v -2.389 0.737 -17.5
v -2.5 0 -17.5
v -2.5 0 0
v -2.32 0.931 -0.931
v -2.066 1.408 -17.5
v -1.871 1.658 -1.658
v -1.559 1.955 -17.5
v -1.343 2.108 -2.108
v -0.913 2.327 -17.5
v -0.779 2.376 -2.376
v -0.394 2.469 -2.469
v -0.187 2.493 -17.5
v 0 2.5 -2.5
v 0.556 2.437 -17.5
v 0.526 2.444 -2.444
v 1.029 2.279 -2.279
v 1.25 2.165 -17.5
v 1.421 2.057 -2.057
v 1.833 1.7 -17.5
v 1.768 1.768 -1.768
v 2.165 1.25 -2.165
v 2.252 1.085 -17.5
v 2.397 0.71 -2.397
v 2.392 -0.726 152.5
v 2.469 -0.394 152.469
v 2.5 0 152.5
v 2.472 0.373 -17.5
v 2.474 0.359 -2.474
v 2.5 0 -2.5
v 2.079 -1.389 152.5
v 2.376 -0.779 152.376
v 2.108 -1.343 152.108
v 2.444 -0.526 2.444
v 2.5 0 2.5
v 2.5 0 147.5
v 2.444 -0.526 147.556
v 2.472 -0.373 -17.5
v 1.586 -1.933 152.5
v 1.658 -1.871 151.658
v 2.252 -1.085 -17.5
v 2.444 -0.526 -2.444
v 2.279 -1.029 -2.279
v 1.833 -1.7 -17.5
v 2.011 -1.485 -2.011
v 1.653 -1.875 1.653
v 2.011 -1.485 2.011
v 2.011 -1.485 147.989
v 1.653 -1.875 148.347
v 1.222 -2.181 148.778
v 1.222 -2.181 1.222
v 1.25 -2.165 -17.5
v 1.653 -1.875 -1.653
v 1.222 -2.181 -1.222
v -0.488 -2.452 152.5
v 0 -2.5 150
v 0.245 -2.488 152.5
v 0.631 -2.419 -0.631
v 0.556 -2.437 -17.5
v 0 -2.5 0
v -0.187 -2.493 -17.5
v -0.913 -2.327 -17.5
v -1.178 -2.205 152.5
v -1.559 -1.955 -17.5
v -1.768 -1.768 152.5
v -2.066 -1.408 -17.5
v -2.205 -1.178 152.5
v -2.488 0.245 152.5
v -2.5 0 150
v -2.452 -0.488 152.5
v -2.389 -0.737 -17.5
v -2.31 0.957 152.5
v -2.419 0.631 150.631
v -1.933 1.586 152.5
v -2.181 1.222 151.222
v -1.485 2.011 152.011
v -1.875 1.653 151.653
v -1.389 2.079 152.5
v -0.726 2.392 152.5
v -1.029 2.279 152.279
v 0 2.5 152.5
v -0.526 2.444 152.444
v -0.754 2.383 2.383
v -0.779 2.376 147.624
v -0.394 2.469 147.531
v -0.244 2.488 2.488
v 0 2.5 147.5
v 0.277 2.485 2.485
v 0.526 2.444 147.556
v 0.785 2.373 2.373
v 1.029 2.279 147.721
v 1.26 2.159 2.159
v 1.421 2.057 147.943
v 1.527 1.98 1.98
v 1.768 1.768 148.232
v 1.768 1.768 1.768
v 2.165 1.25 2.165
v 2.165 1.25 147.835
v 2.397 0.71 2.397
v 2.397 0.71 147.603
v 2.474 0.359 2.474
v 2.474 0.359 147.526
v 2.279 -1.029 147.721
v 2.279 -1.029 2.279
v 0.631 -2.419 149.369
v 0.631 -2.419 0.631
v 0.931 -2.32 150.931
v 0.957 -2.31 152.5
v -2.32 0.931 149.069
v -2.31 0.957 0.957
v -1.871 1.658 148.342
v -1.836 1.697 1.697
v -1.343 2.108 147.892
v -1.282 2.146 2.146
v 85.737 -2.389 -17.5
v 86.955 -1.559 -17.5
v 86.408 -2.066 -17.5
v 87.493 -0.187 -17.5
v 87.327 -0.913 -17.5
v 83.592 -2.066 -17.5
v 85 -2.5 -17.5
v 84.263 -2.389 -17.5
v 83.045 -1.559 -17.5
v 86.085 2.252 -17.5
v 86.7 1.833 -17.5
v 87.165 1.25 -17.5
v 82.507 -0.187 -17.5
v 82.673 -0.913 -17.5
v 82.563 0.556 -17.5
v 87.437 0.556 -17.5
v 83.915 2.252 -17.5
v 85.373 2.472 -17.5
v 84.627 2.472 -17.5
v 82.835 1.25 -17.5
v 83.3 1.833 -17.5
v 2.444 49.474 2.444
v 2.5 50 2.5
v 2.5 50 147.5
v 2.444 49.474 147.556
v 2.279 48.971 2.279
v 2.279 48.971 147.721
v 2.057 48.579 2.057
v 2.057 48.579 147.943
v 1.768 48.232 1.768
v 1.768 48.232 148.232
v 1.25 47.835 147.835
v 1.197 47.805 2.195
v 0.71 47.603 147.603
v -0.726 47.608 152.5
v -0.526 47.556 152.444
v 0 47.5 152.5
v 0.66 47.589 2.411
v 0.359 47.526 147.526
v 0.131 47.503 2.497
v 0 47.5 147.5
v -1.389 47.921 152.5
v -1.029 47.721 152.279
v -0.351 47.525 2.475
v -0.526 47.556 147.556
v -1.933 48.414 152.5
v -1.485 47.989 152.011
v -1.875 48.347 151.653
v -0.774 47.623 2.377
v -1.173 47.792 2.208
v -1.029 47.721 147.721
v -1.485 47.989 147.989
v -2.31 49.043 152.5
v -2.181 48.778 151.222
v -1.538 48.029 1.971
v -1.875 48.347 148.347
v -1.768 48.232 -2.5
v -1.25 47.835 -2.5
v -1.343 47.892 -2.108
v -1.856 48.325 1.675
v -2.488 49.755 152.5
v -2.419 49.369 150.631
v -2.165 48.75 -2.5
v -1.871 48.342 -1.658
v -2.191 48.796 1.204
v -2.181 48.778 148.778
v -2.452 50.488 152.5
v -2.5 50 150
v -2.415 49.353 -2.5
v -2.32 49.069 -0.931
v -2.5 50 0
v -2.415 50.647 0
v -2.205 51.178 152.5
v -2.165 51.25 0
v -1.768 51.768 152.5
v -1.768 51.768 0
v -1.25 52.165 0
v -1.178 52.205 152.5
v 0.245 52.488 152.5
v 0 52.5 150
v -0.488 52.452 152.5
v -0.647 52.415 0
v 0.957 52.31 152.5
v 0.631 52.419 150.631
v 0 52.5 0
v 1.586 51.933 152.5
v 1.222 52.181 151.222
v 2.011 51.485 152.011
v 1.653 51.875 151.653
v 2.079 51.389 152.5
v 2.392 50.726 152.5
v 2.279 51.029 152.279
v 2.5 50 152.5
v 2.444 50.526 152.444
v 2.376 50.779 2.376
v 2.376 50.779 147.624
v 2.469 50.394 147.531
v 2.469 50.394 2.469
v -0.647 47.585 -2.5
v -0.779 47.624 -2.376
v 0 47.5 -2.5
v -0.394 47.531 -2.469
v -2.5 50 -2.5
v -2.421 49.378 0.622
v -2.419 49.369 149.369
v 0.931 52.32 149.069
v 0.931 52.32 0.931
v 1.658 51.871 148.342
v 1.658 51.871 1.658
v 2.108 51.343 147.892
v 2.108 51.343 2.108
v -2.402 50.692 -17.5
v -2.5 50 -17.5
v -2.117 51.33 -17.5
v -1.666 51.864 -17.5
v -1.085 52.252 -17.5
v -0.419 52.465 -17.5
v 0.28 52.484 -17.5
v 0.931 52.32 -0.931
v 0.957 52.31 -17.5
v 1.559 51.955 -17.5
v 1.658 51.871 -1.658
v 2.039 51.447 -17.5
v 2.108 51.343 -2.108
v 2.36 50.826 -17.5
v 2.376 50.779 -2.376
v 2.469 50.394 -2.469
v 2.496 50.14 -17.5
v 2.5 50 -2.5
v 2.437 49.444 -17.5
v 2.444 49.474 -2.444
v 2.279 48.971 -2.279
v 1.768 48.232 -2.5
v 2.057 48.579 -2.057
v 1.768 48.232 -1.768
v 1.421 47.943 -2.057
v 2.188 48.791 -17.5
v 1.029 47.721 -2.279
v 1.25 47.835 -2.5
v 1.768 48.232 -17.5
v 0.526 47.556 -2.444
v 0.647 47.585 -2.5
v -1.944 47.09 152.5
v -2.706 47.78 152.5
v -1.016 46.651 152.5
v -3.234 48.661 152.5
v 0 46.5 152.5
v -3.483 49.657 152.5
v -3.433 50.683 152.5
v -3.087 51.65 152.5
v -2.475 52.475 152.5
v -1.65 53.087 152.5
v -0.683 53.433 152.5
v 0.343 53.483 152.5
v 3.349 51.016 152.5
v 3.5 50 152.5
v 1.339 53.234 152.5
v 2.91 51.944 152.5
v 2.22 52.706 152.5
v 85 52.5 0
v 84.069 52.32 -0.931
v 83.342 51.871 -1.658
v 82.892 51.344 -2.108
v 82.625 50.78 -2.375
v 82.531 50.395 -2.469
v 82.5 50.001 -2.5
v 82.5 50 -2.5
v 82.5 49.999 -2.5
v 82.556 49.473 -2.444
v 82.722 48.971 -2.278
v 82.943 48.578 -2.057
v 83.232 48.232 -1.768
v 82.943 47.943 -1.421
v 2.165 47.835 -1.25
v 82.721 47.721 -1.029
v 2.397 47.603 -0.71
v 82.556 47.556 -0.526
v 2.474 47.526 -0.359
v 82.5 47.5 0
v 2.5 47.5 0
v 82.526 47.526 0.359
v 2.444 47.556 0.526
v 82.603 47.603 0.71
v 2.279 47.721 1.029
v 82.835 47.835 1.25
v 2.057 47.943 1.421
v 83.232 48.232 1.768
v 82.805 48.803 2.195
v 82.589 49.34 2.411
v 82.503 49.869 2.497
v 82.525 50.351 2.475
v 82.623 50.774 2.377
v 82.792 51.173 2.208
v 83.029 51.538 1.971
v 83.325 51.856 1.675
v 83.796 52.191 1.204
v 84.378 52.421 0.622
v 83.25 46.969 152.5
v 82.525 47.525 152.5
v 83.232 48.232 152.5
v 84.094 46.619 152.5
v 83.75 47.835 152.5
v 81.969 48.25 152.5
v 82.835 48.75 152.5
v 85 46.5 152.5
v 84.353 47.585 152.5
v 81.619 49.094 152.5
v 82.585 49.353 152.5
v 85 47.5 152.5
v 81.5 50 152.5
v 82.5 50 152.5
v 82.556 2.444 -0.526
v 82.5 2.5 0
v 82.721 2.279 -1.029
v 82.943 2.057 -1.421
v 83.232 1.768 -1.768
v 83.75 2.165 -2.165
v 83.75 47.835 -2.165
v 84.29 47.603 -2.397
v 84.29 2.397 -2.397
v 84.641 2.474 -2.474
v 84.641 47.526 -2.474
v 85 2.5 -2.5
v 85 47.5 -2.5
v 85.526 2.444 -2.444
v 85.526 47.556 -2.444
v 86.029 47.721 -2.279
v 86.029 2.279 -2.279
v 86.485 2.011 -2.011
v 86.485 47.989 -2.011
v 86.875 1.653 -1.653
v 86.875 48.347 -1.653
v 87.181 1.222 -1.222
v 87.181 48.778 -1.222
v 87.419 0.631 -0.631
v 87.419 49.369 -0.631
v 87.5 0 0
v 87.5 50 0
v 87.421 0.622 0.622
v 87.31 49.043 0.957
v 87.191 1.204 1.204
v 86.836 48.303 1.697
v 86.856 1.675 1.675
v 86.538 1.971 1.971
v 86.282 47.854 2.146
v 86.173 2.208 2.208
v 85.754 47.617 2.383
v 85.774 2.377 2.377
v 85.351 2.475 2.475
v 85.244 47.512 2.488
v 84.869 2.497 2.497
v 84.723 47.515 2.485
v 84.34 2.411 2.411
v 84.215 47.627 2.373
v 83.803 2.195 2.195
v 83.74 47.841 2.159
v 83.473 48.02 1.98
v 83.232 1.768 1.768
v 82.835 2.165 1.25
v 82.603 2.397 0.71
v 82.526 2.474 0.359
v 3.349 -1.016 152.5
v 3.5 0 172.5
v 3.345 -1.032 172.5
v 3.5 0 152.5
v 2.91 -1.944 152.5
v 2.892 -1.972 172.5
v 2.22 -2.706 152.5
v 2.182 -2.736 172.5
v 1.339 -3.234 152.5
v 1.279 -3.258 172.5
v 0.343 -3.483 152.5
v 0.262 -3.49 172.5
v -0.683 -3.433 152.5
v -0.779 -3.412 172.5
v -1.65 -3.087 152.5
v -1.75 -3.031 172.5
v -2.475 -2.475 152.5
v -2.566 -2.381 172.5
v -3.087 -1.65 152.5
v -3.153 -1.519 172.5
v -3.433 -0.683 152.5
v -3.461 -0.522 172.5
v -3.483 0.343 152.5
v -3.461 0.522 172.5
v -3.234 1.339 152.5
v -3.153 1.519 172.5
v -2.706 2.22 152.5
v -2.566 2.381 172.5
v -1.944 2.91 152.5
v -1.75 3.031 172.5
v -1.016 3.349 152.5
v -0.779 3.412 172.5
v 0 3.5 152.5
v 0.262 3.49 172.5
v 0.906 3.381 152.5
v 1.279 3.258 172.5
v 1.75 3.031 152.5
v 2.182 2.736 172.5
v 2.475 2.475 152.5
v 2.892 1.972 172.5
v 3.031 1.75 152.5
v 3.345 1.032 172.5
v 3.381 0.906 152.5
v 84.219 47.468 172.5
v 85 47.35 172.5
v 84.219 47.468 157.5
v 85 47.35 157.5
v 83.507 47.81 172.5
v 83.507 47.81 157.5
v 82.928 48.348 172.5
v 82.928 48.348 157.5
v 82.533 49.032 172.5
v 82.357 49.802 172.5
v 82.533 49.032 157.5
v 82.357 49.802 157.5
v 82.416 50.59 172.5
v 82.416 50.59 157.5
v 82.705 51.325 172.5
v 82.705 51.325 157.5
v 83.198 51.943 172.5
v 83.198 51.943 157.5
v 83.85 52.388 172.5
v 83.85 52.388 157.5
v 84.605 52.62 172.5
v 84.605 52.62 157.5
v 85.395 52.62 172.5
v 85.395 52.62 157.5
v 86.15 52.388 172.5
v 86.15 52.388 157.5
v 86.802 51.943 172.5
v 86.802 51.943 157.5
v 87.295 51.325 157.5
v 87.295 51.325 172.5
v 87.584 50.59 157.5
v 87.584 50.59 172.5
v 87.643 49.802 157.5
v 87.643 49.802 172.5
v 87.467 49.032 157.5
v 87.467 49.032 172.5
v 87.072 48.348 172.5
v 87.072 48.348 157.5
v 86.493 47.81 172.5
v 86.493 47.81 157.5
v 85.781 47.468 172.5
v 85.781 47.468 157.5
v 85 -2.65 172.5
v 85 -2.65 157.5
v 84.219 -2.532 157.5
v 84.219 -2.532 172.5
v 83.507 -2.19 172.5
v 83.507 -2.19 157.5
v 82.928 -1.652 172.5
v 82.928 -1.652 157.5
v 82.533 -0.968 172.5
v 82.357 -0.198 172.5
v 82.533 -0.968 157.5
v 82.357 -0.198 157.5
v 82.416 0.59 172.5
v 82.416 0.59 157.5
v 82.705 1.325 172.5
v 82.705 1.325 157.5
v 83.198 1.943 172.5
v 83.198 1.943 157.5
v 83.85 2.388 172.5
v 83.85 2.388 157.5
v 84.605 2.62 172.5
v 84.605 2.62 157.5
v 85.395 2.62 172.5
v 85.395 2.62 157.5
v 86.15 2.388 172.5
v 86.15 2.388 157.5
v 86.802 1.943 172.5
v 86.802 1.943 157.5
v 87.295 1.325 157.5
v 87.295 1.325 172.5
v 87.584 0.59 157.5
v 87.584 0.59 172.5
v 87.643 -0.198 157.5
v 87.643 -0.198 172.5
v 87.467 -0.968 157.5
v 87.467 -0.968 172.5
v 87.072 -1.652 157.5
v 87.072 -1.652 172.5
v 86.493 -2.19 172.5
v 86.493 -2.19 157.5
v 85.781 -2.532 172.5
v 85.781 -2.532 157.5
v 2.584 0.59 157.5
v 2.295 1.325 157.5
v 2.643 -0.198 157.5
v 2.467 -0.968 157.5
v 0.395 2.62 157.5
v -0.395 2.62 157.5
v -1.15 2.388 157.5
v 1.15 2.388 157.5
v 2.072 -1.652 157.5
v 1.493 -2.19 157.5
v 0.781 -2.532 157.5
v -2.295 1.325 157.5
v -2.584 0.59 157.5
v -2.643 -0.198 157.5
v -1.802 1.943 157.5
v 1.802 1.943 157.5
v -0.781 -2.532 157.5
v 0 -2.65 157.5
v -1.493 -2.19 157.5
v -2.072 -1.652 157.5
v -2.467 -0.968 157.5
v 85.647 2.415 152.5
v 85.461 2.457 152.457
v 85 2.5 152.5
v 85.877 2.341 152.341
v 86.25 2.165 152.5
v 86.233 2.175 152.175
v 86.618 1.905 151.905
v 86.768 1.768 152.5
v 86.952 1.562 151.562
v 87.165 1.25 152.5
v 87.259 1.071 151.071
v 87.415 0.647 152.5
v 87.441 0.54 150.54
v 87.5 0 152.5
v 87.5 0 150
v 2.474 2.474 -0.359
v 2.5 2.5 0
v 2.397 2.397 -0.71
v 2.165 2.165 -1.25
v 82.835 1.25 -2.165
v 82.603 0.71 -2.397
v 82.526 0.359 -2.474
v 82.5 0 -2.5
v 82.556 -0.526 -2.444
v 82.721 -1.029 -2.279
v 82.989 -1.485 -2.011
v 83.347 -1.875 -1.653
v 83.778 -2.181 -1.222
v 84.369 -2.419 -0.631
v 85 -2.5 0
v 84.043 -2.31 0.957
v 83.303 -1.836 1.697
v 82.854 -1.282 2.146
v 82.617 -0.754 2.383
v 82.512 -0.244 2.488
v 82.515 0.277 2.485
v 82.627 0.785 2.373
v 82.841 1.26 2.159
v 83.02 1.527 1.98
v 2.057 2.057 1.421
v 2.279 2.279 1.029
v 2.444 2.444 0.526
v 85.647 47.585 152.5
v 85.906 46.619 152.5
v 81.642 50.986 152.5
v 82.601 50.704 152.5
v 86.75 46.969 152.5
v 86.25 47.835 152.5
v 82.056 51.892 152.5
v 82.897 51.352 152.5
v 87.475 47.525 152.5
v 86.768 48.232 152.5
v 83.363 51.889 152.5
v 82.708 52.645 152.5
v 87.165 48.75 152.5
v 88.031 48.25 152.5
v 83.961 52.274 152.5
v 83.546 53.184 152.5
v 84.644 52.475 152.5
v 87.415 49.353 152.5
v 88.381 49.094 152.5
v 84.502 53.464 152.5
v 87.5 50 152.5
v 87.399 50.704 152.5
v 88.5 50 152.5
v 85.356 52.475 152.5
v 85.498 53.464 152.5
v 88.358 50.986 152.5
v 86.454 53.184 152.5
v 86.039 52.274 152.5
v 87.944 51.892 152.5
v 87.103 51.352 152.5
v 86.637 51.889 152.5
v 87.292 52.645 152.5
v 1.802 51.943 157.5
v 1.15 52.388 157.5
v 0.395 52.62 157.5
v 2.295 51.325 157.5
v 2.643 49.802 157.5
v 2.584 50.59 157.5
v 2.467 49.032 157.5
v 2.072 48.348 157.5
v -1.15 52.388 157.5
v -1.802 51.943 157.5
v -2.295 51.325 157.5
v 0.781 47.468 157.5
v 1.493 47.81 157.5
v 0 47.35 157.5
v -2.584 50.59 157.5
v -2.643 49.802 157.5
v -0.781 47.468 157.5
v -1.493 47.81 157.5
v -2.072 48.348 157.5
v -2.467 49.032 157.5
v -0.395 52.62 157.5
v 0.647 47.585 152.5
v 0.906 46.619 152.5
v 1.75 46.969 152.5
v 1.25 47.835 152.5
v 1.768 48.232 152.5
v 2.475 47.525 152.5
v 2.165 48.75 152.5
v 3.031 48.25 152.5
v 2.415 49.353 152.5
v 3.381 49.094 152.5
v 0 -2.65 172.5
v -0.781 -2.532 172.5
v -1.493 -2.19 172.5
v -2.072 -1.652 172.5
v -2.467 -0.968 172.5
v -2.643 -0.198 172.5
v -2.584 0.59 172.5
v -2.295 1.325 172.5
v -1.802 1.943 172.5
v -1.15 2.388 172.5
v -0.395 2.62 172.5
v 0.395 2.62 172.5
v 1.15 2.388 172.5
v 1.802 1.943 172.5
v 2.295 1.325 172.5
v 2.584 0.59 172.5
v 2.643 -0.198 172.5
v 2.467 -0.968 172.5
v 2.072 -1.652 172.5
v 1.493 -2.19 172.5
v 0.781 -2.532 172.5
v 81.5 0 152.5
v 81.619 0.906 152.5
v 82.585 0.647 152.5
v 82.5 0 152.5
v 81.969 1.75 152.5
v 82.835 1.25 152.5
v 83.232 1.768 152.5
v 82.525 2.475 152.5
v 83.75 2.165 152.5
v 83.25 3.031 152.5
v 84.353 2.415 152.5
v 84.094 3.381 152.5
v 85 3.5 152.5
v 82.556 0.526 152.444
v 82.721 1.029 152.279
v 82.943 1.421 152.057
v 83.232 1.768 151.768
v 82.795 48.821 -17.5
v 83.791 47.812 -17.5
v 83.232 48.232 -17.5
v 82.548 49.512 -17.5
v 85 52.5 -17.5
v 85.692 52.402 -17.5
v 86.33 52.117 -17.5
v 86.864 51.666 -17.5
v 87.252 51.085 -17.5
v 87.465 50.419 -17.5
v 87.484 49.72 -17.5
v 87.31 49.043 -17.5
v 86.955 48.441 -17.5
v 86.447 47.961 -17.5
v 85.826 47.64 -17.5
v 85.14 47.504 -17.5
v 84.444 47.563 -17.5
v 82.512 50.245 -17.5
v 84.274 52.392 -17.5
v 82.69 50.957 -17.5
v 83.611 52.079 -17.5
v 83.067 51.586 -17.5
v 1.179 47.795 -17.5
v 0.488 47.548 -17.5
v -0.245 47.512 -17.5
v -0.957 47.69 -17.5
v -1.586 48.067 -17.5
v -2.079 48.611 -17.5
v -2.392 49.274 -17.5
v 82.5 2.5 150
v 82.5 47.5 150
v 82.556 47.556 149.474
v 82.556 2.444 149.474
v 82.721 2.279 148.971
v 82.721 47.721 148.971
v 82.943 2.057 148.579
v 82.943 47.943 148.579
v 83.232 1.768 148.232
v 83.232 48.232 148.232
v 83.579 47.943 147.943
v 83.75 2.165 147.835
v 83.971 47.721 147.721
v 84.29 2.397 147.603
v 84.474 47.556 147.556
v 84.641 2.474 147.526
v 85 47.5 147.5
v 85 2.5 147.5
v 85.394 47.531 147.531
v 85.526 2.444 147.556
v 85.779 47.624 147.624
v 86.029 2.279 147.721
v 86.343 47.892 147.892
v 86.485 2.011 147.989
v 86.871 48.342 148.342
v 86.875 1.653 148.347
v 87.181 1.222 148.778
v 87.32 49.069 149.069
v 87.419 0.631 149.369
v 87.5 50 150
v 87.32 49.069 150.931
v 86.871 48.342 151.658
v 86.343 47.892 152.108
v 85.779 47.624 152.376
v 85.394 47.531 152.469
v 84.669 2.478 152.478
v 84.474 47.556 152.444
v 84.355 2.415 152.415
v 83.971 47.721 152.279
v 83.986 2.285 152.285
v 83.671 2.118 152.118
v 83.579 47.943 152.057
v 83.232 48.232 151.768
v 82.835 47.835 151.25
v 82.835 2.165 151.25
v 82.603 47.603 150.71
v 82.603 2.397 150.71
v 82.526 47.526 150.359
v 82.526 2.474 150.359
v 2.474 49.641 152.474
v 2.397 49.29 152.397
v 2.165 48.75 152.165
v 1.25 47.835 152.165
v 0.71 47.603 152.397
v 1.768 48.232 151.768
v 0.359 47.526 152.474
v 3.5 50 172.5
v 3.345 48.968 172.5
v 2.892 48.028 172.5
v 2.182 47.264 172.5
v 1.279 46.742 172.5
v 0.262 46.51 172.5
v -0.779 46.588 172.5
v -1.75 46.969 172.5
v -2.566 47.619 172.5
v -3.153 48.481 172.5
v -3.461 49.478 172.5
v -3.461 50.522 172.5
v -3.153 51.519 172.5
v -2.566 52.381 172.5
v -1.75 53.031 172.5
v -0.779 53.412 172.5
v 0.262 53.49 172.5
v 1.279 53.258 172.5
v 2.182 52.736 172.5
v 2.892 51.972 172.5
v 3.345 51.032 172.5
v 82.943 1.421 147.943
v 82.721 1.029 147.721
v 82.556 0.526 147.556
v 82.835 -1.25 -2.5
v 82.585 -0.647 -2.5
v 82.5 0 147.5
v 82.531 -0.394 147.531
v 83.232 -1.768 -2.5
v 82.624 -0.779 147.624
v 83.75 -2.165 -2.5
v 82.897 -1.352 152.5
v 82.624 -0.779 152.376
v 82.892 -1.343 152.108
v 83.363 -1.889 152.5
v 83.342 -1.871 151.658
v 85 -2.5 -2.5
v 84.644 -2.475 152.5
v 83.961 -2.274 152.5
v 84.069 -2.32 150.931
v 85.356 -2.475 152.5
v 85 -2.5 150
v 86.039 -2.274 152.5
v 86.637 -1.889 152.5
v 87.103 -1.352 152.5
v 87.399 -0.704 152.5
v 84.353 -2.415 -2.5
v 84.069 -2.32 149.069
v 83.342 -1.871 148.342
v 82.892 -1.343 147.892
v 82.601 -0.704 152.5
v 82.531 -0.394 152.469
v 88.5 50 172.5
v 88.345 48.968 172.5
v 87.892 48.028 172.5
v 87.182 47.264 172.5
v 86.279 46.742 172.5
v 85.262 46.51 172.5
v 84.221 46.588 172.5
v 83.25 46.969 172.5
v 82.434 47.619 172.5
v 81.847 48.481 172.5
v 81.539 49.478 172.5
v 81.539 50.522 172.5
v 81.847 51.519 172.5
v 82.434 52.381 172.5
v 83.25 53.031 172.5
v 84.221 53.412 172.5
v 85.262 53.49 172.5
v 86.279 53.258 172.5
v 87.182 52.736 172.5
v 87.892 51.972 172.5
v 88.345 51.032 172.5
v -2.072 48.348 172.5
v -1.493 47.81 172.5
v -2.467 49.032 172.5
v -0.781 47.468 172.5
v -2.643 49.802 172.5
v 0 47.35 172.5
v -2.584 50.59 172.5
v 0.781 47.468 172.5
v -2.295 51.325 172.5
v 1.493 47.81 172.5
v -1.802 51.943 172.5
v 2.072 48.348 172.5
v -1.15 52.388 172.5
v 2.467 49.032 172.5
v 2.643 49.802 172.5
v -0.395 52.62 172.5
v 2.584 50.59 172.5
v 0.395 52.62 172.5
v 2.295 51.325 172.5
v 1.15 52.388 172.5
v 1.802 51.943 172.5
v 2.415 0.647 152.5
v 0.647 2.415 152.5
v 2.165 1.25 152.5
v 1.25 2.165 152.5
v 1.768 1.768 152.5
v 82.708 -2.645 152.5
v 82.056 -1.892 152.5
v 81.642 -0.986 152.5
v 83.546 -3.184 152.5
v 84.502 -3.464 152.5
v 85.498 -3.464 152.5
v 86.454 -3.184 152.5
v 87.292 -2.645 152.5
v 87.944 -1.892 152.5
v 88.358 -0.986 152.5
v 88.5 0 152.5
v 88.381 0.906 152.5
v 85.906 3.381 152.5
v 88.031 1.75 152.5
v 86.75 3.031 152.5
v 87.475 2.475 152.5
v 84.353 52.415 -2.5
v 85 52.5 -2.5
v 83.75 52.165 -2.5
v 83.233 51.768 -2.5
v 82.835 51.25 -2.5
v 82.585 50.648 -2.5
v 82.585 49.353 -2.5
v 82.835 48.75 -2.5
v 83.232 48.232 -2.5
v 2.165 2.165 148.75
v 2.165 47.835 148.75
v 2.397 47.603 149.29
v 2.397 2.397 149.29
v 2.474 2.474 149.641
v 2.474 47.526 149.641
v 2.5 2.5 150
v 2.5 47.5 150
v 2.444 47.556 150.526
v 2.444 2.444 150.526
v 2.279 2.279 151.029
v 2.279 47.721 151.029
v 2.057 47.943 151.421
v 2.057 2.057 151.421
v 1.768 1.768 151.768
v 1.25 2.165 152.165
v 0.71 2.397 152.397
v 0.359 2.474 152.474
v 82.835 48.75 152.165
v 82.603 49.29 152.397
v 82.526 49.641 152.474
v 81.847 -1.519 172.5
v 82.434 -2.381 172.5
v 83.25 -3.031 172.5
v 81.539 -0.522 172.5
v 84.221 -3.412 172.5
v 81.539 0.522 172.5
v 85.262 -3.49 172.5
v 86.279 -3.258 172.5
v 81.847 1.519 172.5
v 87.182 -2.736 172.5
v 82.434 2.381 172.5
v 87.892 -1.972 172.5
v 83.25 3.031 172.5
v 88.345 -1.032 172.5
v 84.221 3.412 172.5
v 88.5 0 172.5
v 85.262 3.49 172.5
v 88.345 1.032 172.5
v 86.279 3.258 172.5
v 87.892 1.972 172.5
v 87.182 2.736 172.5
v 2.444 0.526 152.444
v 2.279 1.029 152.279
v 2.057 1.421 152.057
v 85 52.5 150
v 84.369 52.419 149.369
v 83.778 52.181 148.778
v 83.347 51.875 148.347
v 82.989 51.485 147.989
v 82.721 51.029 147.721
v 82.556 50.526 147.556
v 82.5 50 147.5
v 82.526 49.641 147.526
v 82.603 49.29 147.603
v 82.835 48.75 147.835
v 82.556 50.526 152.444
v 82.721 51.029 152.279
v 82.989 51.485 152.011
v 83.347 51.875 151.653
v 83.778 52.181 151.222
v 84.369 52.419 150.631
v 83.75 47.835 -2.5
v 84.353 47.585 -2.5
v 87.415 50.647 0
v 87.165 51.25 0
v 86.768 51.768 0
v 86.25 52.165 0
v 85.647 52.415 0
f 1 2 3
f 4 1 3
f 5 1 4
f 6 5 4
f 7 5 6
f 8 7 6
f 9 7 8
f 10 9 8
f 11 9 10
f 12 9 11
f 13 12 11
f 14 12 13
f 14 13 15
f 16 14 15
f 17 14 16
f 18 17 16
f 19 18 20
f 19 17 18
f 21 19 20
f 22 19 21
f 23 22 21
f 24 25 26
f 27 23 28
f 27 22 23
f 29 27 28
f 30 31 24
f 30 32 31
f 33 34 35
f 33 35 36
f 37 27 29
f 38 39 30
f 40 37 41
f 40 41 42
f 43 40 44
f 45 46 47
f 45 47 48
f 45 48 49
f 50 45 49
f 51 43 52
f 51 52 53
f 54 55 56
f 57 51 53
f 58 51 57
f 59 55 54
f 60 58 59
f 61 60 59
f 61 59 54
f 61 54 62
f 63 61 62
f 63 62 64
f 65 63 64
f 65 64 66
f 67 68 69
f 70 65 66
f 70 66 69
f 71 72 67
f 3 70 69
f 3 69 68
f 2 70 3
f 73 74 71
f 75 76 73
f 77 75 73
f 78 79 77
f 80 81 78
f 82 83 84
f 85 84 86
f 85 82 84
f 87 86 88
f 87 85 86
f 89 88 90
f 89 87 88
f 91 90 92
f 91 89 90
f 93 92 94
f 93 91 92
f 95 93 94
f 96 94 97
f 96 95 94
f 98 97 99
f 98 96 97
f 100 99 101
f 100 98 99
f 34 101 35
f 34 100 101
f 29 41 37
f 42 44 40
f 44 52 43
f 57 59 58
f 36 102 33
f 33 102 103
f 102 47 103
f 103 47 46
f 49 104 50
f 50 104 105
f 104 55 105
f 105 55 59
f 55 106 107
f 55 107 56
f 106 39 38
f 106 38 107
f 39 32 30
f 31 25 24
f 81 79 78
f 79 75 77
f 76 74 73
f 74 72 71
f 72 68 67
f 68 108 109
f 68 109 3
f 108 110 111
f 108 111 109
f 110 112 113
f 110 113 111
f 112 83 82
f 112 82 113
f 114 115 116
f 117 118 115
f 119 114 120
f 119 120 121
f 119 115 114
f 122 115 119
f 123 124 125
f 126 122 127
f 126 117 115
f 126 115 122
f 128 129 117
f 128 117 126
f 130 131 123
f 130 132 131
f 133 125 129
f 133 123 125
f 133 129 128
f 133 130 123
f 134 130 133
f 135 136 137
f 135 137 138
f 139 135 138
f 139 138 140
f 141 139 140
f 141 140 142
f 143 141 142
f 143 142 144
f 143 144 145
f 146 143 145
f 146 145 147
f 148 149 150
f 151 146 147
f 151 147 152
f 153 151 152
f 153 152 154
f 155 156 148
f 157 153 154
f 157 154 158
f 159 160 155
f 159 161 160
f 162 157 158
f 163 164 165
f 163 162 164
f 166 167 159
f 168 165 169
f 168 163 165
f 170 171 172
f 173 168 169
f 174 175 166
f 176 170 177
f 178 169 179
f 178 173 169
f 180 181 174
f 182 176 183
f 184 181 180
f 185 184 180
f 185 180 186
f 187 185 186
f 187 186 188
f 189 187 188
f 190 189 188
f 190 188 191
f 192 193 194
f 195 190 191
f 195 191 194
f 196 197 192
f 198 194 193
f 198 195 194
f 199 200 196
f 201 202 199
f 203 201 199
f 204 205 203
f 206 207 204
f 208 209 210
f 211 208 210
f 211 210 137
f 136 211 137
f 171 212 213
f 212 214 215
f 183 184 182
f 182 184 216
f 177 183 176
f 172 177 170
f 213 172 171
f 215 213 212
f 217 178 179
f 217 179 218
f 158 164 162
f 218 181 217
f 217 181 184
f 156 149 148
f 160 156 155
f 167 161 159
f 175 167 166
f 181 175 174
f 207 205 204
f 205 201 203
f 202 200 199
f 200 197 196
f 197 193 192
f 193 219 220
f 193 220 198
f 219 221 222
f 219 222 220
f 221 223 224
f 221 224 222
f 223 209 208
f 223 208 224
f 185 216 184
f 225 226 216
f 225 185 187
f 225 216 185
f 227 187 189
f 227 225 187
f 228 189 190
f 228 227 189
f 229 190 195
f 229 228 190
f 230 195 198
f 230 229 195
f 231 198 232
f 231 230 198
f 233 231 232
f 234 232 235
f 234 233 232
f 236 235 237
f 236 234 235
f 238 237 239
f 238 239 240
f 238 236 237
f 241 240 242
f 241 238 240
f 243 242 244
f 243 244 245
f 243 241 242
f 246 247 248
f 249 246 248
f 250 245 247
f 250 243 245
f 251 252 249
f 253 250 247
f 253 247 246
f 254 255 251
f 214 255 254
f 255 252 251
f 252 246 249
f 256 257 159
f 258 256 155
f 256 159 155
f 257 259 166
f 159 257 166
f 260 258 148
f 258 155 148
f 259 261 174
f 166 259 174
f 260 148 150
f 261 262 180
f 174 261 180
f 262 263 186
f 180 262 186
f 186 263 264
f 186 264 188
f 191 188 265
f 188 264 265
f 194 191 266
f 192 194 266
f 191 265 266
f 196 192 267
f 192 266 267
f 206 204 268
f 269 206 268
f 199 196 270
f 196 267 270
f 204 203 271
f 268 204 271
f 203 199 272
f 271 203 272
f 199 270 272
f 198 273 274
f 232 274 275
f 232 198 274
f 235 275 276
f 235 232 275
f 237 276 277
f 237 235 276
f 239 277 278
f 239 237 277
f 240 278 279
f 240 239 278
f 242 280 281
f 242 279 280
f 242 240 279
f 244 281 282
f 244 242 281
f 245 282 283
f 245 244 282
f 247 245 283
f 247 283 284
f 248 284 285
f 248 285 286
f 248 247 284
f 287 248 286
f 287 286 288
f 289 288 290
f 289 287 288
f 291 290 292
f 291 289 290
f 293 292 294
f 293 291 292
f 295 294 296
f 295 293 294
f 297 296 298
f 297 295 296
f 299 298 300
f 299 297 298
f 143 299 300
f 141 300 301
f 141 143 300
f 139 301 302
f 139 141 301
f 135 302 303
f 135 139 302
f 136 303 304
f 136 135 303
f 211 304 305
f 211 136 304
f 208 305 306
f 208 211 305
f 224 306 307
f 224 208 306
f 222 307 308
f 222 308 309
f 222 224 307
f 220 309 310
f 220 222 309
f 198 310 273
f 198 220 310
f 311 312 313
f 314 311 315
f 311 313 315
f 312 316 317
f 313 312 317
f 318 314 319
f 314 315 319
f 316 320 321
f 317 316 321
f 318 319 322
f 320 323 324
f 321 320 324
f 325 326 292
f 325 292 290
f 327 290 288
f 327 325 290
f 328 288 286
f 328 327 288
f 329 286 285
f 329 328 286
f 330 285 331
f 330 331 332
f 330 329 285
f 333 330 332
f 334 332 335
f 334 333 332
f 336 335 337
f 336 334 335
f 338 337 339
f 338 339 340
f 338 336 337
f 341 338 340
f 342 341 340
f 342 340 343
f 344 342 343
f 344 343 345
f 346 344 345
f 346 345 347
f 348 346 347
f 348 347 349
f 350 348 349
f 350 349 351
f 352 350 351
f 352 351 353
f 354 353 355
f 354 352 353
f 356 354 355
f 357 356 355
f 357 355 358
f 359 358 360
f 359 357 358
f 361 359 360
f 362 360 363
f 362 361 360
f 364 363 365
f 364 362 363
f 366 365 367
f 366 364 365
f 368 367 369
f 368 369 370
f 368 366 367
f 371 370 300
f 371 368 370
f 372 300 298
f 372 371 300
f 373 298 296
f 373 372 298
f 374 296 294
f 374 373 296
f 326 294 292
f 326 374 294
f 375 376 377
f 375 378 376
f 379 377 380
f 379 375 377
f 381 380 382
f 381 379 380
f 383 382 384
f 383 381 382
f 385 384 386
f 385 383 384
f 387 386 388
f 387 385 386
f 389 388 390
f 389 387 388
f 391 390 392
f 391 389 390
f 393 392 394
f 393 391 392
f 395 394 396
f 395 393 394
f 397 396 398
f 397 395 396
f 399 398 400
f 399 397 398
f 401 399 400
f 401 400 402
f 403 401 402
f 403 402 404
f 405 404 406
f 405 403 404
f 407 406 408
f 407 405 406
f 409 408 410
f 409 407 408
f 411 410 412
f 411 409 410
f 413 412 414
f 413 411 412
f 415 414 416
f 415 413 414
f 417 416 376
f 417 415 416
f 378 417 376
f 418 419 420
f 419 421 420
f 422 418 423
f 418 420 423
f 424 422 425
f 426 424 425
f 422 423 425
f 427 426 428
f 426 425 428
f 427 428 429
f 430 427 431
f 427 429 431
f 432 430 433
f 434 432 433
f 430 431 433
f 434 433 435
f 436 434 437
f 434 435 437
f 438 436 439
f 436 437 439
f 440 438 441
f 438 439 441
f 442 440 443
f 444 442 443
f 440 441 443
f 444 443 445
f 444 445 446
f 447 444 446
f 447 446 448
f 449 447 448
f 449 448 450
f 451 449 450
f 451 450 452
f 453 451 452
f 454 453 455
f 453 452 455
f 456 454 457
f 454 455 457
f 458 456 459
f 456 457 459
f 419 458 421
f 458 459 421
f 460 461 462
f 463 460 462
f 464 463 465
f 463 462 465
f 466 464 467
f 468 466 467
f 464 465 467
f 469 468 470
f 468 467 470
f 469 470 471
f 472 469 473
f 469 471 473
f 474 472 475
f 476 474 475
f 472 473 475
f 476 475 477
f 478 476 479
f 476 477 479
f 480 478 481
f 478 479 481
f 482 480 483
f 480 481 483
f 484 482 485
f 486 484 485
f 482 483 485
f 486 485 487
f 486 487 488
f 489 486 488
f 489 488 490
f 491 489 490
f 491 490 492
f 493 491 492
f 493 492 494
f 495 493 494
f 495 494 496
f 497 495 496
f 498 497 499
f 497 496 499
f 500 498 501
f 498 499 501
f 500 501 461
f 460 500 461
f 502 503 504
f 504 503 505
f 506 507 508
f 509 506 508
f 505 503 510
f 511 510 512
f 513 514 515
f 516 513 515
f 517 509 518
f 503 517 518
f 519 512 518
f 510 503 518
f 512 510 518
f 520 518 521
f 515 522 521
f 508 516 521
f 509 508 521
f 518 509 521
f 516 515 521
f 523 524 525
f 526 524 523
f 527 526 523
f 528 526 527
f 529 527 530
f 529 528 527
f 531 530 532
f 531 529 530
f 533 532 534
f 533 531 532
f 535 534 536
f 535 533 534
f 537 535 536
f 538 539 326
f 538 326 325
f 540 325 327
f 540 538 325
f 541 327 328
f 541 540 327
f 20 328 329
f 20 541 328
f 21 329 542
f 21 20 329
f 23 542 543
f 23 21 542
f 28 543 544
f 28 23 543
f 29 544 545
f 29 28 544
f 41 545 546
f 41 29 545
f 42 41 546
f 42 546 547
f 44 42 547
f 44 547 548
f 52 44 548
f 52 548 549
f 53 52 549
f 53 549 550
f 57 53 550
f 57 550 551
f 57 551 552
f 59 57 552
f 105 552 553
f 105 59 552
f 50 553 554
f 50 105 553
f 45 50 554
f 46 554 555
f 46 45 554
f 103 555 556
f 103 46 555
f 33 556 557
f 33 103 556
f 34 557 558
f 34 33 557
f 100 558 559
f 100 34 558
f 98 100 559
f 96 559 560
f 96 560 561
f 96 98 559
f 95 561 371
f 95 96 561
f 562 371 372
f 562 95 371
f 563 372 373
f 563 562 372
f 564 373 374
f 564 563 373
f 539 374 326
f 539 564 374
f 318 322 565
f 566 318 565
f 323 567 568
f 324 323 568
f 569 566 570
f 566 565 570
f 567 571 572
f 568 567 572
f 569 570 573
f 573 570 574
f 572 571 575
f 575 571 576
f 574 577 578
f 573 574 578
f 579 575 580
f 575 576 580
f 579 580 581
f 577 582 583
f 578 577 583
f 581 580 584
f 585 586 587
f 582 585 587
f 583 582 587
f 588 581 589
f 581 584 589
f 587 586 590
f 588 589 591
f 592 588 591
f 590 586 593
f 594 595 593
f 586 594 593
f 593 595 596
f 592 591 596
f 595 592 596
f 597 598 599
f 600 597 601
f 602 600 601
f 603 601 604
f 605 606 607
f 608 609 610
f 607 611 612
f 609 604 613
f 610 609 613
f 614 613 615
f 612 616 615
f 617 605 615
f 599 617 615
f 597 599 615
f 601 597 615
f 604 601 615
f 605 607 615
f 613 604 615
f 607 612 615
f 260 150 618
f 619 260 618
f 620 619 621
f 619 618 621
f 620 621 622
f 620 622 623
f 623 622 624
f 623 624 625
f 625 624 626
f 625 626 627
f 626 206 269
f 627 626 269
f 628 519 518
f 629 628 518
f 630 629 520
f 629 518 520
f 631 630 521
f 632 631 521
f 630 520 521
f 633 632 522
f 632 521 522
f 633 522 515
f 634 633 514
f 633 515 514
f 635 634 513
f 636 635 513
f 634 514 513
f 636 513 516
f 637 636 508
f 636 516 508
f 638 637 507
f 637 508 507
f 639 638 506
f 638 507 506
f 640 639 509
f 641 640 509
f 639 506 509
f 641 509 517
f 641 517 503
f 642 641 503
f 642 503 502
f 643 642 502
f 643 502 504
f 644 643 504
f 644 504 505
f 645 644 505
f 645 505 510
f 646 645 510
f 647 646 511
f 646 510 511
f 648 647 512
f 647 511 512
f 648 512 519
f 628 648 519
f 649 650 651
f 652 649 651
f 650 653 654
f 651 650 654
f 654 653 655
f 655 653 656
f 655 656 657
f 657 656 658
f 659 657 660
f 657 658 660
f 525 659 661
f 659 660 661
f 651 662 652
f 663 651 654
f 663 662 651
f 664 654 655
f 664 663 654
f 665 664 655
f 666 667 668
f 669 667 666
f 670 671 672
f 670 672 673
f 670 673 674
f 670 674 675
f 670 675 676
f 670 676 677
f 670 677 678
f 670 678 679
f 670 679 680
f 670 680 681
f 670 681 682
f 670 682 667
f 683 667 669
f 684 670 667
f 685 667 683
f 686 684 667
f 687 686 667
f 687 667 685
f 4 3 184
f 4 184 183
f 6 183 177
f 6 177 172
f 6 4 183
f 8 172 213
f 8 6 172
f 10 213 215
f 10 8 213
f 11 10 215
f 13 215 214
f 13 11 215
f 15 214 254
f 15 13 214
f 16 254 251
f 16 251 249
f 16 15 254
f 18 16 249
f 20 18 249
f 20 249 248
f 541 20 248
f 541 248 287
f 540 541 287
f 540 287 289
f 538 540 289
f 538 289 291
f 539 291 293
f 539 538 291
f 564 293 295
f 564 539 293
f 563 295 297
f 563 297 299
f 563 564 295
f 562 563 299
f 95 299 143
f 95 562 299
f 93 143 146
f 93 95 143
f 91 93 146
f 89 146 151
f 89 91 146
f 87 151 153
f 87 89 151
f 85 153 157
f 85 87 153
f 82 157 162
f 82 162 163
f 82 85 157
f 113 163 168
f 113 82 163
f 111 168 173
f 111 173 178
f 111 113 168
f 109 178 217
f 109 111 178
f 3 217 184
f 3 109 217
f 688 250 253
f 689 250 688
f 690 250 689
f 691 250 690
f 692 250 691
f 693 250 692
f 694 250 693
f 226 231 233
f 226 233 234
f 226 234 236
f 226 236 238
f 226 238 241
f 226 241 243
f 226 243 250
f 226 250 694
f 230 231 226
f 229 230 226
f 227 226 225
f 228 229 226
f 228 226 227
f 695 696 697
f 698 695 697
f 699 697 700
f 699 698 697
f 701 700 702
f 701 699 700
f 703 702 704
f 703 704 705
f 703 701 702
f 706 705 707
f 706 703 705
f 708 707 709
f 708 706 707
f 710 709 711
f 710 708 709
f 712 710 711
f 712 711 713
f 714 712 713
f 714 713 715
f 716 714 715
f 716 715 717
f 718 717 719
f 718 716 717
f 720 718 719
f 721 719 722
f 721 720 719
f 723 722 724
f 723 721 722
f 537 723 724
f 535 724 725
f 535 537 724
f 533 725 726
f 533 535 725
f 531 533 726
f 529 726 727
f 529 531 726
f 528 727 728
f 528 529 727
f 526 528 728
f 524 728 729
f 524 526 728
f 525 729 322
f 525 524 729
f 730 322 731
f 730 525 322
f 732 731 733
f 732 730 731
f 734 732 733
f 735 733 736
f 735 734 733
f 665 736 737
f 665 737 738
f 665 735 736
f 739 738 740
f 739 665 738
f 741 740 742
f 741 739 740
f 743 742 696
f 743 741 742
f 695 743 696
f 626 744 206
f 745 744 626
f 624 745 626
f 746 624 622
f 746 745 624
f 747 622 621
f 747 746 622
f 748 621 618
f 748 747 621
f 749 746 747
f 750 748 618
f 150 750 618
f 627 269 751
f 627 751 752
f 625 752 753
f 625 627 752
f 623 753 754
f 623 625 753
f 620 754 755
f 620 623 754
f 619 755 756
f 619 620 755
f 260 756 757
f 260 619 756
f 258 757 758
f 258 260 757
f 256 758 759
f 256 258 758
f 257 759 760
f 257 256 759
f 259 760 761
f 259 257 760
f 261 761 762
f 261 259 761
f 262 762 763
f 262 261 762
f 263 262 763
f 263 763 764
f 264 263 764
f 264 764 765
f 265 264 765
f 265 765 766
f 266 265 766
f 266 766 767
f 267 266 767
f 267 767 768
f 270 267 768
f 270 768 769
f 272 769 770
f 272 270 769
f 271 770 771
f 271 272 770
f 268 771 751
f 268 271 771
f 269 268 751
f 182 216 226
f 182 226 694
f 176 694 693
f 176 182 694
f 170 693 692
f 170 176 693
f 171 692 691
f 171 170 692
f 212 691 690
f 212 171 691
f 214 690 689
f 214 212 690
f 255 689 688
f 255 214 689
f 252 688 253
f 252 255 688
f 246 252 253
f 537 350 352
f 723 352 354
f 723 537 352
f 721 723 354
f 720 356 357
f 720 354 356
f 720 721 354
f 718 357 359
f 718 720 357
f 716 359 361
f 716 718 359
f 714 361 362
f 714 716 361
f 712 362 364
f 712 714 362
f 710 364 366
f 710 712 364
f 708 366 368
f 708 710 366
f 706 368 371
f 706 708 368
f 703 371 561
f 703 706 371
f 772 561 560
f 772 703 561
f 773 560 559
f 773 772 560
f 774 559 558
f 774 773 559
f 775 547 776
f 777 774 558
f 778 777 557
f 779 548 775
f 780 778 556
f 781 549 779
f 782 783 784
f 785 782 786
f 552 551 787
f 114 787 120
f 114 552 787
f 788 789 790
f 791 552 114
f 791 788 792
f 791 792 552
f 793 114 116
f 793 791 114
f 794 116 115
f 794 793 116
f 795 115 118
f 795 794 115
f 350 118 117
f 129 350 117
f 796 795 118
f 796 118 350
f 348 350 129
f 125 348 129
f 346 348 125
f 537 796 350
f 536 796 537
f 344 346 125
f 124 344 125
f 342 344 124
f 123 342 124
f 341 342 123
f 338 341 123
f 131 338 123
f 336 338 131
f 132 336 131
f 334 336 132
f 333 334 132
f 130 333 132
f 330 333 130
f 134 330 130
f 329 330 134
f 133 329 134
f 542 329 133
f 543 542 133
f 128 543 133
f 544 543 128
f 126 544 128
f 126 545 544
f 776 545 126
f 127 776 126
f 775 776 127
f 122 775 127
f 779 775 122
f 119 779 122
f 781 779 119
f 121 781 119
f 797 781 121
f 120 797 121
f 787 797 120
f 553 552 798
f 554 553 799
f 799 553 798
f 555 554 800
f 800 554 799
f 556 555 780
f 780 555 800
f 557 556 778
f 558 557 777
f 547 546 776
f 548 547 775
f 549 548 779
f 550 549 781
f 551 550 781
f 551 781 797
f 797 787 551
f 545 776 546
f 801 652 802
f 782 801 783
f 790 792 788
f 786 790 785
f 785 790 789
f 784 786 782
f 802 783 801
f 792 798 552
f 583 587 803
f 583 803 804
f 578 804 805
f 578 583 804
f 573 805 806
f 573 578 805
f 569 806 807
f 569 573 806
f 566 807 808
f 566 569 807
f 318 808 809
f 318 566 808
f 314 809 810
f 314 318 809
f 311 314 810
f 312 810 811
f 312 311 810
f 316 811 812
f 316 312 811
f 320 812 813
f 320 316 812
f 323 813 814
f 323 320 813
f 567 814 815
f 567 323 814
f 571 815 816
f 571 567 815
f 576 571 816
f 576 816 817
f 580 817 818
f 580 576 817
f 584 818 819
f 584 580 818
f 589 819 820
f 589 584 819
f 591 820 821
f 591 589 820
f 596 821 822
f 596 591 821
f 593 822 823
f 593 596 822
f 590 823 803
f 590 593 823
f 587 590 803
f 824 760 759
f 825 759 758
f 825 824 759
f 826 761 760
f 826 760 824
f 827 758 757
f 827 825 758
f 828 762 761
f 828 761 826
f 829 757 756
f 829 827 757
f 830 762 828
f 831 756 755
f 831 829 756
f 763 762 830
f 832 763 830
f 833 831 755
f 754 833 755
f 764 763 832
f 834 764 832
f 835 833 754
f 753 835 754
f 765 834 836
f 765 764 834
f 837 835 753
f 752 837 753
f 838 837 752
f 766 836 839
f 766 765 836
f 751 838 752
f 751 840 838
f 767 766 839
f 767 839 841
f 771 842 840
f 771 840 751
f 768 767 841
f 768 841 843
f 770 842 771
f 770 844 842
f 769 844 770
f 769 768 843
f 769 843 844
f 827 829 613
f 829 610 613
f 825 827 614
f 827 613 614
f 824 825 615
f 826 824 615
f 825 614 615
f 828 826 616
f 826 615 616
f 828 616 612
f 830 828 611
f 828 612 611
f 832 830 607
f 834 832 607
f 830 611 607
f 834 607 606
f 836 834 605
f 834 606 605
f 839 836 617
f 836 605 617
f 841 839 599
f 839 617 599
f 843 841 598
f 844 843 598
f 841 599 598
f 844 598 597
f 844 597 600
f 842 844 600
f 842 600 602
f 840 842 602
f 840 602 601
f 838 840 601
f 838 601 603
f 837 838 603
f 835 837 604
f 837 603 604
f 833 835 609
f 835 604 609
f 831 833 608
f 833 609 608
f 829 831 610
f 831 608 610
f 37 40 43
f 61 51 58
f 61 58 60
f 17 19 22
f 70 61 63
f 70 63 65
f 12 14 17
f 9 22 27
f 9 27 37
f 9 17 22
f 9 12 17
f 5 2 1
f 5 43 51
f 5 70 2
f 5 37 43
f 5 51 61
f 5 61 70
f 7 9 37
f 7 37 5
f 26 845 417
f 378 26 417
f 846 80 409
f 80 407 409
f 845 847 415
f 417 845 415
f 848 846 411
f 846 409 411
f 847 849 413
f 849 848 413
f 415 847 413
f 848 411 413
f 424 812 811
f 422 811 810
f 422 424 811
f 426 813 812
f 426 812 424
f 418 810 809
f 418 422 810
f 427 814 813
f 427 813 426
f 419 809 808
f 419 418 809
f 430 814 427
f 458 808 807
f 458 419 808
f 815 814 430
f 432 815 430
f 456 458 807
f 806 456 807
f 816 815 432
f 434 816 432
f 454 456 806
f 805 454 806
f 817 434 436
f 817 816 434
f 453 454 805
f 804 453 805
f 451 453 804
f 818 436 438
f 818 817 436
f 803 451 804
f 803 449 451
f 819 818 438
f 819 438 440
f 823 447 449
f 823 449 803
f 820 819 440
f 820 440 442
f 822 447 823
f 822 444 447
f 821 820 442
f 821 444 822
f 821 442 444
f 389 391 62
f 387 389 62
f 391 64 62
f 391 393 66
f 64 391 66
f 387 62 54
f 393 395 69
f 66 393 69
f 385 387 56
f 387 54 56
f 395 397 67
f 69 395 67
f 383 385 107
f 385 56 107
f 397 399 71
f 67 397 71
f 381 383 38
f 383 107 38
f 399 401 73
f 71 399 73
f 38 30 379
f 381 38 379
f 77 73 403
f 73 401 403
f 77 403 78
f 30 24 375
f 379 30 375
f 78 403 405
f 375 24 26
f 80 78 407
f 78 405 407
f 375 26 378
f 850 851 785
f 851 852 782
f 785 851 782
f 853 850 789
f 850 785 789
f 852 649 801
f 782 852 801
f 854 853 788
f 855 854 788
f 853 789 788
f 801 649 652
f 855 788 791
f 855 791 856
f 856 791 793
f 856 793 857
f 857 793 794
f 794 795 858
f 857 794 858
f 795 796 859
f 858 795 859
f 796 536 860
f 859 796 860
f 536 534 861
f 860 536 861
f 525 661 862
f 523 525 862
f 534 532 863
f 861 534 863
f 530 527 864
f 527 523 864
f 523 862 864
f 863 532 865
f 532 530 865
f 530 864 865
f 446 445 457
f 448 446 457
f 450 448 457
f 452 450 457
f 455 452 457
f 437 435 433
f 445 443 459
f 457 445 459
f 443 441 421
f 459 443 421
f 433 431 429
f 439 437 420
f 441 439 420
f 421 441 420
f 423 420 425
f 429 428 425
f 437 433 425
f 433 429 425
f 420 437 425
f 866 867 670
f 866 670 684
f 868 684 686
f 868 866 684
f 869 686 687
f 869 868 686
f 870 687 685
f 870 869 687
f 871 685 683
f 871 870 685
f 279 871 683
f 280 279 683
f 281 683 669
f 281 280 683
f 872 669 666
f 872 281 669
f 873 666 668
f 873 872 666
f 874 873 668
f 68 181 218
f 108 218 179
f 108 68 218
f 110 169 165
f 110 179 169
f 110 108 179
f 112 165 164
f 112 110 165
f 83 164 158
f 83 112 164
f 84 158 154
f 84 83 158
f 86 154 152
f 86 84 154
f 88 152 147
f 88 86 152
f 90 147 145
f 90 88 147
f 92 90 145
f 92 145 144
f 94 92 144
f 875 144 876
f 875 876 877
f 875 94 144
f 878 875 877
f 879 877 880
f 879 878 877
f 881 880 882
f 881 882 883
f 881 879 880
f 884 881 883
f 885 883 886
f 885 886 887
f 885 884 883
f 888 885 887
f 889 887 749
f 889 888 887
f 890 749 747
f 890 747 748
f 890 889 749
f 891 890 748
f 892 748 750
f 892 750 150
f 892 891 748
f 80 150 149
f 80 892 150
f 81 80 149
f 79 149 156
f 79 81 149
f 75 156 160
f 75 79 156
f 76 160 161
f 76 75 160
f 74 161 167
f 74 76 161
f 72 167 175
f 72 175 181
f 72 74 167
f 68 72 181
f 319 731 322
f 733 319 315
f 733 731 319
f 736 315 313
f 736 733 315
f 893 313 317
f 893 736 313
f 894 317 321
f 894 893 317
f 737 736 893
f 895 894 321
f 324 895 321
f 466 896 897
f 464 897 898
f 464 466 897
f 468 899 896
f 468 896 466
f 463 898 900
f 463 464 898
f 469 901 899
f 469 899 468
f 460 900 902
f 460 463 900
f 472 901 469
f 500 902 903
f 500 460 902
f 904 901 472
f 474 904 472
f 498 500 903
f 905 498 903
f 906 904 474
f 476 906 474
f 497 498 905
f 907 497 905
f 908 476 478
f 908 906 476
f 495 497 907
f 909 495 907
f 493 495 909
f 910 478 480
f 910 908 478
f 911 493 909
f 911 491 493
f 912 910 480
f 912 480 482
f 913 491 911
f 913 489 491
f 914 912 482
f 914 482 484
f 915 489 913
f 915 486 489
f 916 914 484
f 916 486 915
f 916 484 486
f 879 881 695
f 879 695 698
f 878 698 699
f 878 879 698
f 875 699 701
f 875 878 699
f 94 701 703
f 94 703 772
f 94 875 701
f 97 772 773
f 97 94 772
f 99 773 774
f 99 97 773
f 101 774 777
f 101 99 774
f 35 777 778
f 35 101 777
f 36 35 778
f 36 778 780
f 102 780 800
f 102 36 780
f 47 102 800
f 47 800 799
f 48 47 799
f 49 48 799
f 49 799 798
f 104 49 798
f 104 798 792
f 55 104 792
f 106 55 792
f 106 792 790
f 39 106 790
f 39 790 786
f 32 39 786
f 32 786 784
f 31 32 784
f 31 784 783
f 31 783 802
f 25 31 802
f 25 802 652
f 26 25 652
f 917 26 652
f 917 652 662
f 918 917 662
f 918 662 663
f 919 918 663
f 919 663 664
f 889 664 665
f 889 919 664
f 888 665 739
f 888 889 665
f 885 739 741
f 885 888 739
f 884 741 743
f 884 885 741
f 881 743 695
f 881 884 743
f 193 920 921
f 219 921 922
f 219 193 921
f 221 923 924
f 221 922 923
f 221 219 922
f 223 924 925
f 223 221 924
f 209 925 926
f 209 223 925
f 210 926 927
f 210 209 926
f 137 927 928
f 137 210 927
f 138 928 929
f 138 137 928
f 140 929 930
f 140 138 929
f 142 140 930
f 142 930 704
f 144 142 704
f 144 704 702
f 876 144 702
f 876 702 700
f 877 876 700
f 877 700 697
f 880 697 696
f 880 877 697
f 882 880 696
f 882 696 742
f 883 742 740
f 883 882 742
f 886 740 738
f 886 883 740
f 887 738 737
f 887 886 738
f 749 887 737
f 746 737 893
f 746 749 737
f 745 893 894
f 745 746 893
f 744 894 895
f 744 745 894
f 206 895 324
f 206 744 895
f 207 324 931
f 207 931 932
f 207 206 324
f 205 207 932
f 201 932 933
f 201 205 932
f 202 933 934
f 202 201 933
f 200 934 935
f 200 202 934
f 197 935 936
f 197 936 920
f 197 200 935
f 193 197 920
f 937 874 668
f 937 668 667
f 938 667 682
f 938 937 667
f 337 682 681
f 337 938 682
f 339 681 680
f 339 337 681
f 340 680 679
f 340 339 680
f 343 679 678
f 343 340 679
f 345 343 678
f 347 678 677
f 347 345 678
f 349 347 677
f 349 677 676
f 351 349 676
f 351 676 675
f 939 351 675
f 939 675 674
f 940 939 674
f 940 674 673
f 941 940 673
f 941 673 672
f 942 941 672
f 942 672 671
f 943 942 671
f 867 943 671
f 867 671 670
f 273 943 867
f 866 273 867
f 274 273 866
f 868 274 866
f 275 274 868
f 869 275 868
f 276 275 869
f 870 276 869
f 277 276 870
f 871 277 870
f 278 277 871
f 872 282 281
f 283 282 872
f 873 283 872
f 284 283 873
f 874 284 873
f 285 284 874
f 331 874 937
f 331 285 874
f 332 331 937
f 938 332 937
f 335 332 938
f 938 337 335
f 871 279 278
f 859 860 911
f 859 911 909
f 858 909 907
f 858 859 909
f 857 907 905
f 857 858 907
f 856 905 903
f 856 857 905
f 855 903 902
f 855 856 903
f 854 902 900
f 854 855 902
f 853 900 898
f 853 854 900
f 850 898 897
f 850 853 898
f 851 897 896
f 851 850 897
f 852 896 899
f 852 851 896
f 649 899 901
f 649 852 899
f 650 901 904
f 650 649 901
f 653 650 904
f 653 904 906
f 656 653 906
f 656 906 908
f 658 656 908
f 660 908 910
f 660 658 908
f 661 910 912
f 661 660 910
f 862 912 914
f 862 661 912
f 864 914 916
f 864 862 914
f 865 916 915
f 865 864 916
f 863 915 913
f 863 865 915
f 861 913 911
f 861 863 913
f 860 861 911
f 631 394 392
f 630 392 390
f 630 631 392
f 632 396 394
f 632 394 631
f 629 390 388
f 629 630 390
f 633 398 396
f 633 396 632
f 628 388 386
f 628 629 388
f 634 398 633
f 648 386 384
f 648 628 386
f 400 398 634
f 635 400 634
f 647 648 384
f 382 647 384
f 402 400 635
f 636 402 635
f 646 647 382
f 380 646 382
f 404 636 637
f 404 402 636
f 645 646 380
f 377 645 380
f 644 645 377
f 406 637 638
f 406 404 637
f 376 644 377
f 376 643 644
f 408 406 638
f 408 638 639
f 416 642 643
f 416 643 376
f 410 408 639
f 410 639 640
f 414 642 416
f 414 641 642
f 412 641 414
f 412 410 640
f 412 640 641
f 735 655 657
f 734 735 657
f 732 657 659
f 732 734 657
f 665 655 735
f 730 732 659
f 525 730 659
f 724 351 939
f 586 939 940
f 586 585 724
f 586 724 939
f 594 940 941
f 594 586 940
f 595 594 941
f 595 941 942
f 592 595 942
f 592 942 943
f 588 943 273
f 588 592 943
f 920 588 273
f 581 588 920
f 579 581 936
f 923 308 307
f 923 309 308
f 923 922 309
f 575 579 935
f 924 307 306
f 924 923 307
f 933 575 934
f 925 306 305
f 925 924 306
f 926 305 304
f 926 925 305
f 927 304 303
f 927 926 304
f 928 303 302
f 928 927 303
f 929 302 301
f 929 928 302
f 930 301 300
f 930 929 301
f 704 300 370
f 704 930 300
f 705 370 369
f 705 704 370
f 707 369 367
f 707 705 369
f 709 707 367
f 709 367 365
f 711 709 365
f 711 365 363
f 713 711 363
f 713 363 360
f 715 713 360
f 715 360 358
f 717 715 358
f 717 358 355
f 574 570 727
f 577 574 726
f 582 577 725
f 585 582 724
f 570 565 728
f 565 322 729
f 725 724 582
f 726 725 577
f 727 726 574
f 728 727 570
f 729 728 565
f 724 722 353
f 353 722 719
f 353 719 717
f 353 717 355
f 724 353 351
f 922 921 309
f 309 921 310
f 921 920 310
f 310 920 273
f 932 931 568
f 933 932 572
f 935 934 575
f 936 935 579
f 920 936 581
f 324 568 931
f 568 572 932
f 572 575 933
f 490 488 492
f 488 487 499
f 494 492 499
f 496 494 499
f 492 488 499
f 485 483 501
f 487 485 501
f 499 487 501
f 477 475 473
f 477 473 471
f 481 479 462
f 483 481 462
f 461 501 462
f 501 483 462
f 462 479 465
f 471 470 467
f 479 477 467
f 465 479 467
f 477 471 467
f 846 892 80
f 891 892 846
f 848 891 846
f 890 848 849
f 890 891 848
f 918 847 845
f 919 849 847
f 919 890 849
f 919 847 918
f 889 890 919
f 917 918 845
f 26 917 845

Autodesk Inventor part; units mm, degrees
ref_plane "YZ Plane" through (0, 0, 0) normal (1, 0, 0) x (0, 1, 0)
ref_plane "XZ Plane" through (0, 0, 0) normal (0, 1, 0) x (-1, 0, 0)
ref_plane "XY Plane" through (0, 0, 0) normal (0, 0, 1) x (1, 0, 0)
sketch "Sketch1" plane through (0, 0, 0) normal (0, 0, 1) x (1, 0, 0)
  line L0 (0, 0) -> (85, 0) construction
  line L1 (85, 0) -> (85, 50) construction
  line L2 (85, 50) -> (0, 50) construction
  line L3 (0, 50) -> (0, 0) construction
  circle A0 centre (0, 0) radius 2.5
  circle A1 centre (0, 50) radius 2.5
  circle A2 centre (85, 50) radius 2.5
  circle A3 centre (85, 0) radius 2.5
  dimension "d0" = 85
  dimension "d1" = 50
  dimension "d2" = 5
  dimension "d3" = 5
  dimension "d4" = 5
  dimension "d5" = 5
extrude "Length Beams" add sketch "Sketch1" along normal blind 150
sketch "Sketch2" plane through (0, 0, 0) normal (0, 1, 0) x (-1, 0, 0)
  circle A0 centre (0, 0) radius 2.5
  line L0 (-82.5, 0) -> (-87.5, 0) projected
  circle A1 centre (-85, 0) radius 2.5
  line L1 (2.5, 150) -> (-2.5, 150) projected
  circle A2 centre (0, 150) radius 2.5
  line L2 (-82.5, 150) -> (-87.5, 150) projected
  circle A3 centre (-85, 150) radius 2.5
  dimension "d8" = 5
  dimension "d9" = 5
  dimension "d10" = 5
  dimension "d11" = 5
extrude "Vertical Beam" add sketch "Sketch2" along normal blind 50
sketch "Sketch3" plane through (0, 0, 0) normal (1, 0, 0) x (0, 1, 0)
  circle A0 centre (50, 0) radius 2.5
  circle A1 centre (0, 0) radius 2.5
  circle A2 centre (0, 150) radius 2.5
  line L0 (50, 150) -> (50, 152.5) projected
  circle A3 centre (50, 150) radius 2.5
  dimension "d14" = 5
  dimension "d15" = 5
  dimension "d16" = 5
  dimension "d17" = 5
extrude "Width Beams" add sketch "Sketch3" along normal blind 85
sketch "Sketch4" plane through (0, 0, 150) normal (0, 0, 1) x (1, 0, 0)
  arc A0 (0, 52.5) -> (-2.5, 50) centre (0, 50) ccw projected
  circle A1 centre (0, 50) radius 2.5
  line L0 (82.5, 47.5) -> (85, 50) projected
  circle A2 centre (85, 50) radius 2.5
  arc A3 (87.5, 0) -> (83.2322, 1.7678) centre (85, 0) ccw projected
  circle A4 centre (85, 0) radius 2.5
  circle A5 centre (0, 0) radius 2.5
  point P0 (83.2322, 48.2322)
  point P1 (83.2322, 1.7678)
  dimension "d20" = 5
  dimension "d21" = 5
  dimension "d22" = 5
  dimension "d23" = 5
extrude "Female Flush" add sketch "Sketch4" along normal blind 2.5
sketch "Sketch7" plane through (0, 0, 0) normal (0, 0, -1) x (-1, 0, 0)
  circle A0 centre (0, 0) radius 2.5
  arc A1 (-2.5, 50) -> (0, 47.5) centre (0, 50) ccw projected
  circle A2 centre (0, 50) radius 2.5
  arc A3 (-85, 47.5) -> (-82.5, 50) centre (-85, 50) ccw projected
  circle A4 centre (-85, 50) radius 2.5
  circle A5 centre (-85, 0) radius 2.5
  dimension "d40" = 5
  dimension "d41" = 5
  dimension "d42" = 5
extrude "Male Flush" add sketch "Sketch7" along normal blind 2.5
sketch "Sketch9" plane through (0, 0, -2.5) normal (0, 0, -1) x (-1, 0, 0)
  circle A0 centre (0, 0) radius 2.5
  arc A1 (-1.7678, 48.2322) -> (2.5, 50) centre (0, 50) ccw projected
  circle A2 centre (0, 50) radius 2.5
  arc A3 (-83.2322, 48.2322) -> (-85, 52.5) centre (-85, 50) ccw projected
  circle A4 centre (-85, 50) radius 2.5
  arc A5 (-85, -2.5) -> (-82.5, 0) centre (-85, 0) ccw projected
  circle A6 centre (-85, 0) radius 2.5
  point P0 (2.5, 50)
  point P1 (-1.7678, 48.2322)
  point P2 (-85, 52.5)
  point P3 (-82.5, 0)
  point P4 (-85, -2.5)
  dimension "d45" = 5
  dimension "d46" = 5
  dimension "d47" = 5
  dimension "d48" = 5
extrude "Male Connect" add sketch "Sketch9" along normal blind 15
sketch "Sketch10" plane through (0, 0, 152.5) normal (0, 0, 1) x (1, 0, 0)
  arc A0 (0, 47.5) -> (1.7678, 48.2322) centre (0, 50) ccw projected
  circle A1 centre (0, 50) radius 3.5
  arc A2 (83.2322, 48.2322) -> (87.5, 50) centre (85, 50) ccw projected
  circle A3 centre (85, 50) radius 3.5
  circle A4 centre (0, 0) radius 3.5
  arc A5 (87.5, 0) -> (83.2322, 1.7678) centre (85, 0) ccw projected
  circle A6 centre (85, 0) radius 3.5
  dimension "d51" = 7
  dimension "d52" = 7
  dimension "d62" = 7
  dimension "d63" = 7
extrude "Female Connect Top" add sketch "Sketch10" along normal blind 20 contours A1 | A3
extrude "Extrusion9" add sketch "Sketch10" along normal blind 20 contours A4 | A6
sketch "Sketch12" plane through (0, 0, 172.5) normal (0, 0, 1) x (1, 0, 0)
  arc A0 (0, 47.5) -> (1.7678, 48.2322) centre (0, 50) ccw projected
  arc A1 (81.5, 50) -> (85, 46.5) centre (85, 50) ccw projected
  arc A2 (81.5, 0) -> (85, 3.5) centre (85, 0) ccw projected
  point P0 (0, 0)
  point P1 (0, 0)
hole "Hole3" at (0, 50, 172.5) at (85, 50, 172.5) at (85, 0, 172.5) at (0, 0, 172.5) direction (0, 0, -1) diameter 5.3 depth 15
equation "\"fitTol\" = 0.3"
properties part number "RCPlaneSkeletonMiddleBack2"
